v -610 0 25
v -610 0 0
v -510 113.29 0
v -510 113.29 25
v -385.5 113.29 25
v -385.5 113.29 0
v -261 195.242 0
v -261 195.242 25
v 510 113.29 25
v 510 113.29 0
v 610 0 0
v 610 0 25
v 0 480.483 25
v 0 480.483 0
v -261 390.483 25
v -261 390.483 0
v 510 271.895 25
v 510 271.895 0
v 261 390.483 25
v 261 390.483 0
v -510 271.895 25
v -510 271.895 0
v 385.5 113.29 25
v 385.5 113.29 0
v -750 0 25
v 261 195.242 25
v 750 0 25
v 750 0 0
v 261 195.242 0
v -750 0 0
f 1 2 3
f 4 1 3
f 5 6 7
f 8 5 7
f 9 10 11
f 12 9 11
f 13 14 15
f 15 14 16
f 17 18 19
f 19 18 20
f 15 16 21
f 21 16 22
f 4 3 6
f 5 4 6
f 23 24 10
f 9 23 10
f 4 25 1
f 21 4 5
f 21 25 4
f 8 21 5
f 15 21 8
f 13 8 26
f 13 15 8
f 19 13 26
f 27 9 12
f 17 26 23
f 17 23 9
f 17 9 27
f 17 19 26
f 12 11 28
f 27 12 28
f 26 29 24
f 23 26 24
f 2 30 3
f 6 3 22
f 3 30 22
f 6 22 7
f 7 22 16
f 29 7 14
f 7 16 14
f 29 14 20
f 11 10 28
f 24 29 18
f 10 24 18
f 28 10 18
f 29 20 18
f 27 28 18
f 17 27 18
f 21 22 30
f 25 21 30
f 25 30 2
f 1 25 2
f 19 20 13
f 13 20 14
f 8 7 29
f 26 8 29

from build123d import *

# Parameters (mm, degrees)
F1_DEPTH = 25
F3_DEPTH = 25
F4_W     = 200
F4_H     = 100
F5_DEPTH = 25


with BuildPart() as f1:
    # F0 (on Top) → F1 (new body)
    with BuildSketch(Plane.XY):
        Polygon((-510, 271.8948125839), (-750, 0), (0, 0), (0, 271.8948125839), align=None)
        Polygon((-261, 390.4831971128), (-510, 271.8948125839), (0, 271.8948125839), (0, 390.4831971128), align=None)
        Polygon((0, 480.4831971128), (-261, 390.4831971128), (0, 390.4831971128), align=None)
        Polygon((0, 480.4831971128), (0, 390.4831971128), (261, 390.4831971128), align=None)
        Polygon((0, 390.4831971128), (0, 271.8948125839), (510, 271.8948125839), (261, 390.4831971128), align=None)
        Polygon((0, 271.8948125839), (0, 0), (750, 0), (510, 271.8948125839), align=None)
    extrude(amount=F1_DEPTH)

    # F2 (on face) → F3 (cut)
    with BuildSketch(Plane(origin=(0, 0, 0), x_dir=(1, 0, 0), z_dir=(0, 0, -1))):
        Polygon((610, 0), (-610, 0), (-510, -113.2895052433), (-385.5, -113.2895052433), (-261, -195.2415985564), (261, -195.2415985564), (385.5, -113.2895052433), (510, -113.2895052433), align=None)
    extrude(amount=-F3_DEPTH, mode=Mode.SUBTRACT)


with BuildPart() as f5:
    # F4 (on face) → F5 (new body)
    with BuildSketch(Plane.XY.offset(25)):
        with Locations((0, 145.2415985564)):
            Rectangle(F4_W, F4_H)
    extrude(amount=-F5_DEPTH)


solid = f1.part
